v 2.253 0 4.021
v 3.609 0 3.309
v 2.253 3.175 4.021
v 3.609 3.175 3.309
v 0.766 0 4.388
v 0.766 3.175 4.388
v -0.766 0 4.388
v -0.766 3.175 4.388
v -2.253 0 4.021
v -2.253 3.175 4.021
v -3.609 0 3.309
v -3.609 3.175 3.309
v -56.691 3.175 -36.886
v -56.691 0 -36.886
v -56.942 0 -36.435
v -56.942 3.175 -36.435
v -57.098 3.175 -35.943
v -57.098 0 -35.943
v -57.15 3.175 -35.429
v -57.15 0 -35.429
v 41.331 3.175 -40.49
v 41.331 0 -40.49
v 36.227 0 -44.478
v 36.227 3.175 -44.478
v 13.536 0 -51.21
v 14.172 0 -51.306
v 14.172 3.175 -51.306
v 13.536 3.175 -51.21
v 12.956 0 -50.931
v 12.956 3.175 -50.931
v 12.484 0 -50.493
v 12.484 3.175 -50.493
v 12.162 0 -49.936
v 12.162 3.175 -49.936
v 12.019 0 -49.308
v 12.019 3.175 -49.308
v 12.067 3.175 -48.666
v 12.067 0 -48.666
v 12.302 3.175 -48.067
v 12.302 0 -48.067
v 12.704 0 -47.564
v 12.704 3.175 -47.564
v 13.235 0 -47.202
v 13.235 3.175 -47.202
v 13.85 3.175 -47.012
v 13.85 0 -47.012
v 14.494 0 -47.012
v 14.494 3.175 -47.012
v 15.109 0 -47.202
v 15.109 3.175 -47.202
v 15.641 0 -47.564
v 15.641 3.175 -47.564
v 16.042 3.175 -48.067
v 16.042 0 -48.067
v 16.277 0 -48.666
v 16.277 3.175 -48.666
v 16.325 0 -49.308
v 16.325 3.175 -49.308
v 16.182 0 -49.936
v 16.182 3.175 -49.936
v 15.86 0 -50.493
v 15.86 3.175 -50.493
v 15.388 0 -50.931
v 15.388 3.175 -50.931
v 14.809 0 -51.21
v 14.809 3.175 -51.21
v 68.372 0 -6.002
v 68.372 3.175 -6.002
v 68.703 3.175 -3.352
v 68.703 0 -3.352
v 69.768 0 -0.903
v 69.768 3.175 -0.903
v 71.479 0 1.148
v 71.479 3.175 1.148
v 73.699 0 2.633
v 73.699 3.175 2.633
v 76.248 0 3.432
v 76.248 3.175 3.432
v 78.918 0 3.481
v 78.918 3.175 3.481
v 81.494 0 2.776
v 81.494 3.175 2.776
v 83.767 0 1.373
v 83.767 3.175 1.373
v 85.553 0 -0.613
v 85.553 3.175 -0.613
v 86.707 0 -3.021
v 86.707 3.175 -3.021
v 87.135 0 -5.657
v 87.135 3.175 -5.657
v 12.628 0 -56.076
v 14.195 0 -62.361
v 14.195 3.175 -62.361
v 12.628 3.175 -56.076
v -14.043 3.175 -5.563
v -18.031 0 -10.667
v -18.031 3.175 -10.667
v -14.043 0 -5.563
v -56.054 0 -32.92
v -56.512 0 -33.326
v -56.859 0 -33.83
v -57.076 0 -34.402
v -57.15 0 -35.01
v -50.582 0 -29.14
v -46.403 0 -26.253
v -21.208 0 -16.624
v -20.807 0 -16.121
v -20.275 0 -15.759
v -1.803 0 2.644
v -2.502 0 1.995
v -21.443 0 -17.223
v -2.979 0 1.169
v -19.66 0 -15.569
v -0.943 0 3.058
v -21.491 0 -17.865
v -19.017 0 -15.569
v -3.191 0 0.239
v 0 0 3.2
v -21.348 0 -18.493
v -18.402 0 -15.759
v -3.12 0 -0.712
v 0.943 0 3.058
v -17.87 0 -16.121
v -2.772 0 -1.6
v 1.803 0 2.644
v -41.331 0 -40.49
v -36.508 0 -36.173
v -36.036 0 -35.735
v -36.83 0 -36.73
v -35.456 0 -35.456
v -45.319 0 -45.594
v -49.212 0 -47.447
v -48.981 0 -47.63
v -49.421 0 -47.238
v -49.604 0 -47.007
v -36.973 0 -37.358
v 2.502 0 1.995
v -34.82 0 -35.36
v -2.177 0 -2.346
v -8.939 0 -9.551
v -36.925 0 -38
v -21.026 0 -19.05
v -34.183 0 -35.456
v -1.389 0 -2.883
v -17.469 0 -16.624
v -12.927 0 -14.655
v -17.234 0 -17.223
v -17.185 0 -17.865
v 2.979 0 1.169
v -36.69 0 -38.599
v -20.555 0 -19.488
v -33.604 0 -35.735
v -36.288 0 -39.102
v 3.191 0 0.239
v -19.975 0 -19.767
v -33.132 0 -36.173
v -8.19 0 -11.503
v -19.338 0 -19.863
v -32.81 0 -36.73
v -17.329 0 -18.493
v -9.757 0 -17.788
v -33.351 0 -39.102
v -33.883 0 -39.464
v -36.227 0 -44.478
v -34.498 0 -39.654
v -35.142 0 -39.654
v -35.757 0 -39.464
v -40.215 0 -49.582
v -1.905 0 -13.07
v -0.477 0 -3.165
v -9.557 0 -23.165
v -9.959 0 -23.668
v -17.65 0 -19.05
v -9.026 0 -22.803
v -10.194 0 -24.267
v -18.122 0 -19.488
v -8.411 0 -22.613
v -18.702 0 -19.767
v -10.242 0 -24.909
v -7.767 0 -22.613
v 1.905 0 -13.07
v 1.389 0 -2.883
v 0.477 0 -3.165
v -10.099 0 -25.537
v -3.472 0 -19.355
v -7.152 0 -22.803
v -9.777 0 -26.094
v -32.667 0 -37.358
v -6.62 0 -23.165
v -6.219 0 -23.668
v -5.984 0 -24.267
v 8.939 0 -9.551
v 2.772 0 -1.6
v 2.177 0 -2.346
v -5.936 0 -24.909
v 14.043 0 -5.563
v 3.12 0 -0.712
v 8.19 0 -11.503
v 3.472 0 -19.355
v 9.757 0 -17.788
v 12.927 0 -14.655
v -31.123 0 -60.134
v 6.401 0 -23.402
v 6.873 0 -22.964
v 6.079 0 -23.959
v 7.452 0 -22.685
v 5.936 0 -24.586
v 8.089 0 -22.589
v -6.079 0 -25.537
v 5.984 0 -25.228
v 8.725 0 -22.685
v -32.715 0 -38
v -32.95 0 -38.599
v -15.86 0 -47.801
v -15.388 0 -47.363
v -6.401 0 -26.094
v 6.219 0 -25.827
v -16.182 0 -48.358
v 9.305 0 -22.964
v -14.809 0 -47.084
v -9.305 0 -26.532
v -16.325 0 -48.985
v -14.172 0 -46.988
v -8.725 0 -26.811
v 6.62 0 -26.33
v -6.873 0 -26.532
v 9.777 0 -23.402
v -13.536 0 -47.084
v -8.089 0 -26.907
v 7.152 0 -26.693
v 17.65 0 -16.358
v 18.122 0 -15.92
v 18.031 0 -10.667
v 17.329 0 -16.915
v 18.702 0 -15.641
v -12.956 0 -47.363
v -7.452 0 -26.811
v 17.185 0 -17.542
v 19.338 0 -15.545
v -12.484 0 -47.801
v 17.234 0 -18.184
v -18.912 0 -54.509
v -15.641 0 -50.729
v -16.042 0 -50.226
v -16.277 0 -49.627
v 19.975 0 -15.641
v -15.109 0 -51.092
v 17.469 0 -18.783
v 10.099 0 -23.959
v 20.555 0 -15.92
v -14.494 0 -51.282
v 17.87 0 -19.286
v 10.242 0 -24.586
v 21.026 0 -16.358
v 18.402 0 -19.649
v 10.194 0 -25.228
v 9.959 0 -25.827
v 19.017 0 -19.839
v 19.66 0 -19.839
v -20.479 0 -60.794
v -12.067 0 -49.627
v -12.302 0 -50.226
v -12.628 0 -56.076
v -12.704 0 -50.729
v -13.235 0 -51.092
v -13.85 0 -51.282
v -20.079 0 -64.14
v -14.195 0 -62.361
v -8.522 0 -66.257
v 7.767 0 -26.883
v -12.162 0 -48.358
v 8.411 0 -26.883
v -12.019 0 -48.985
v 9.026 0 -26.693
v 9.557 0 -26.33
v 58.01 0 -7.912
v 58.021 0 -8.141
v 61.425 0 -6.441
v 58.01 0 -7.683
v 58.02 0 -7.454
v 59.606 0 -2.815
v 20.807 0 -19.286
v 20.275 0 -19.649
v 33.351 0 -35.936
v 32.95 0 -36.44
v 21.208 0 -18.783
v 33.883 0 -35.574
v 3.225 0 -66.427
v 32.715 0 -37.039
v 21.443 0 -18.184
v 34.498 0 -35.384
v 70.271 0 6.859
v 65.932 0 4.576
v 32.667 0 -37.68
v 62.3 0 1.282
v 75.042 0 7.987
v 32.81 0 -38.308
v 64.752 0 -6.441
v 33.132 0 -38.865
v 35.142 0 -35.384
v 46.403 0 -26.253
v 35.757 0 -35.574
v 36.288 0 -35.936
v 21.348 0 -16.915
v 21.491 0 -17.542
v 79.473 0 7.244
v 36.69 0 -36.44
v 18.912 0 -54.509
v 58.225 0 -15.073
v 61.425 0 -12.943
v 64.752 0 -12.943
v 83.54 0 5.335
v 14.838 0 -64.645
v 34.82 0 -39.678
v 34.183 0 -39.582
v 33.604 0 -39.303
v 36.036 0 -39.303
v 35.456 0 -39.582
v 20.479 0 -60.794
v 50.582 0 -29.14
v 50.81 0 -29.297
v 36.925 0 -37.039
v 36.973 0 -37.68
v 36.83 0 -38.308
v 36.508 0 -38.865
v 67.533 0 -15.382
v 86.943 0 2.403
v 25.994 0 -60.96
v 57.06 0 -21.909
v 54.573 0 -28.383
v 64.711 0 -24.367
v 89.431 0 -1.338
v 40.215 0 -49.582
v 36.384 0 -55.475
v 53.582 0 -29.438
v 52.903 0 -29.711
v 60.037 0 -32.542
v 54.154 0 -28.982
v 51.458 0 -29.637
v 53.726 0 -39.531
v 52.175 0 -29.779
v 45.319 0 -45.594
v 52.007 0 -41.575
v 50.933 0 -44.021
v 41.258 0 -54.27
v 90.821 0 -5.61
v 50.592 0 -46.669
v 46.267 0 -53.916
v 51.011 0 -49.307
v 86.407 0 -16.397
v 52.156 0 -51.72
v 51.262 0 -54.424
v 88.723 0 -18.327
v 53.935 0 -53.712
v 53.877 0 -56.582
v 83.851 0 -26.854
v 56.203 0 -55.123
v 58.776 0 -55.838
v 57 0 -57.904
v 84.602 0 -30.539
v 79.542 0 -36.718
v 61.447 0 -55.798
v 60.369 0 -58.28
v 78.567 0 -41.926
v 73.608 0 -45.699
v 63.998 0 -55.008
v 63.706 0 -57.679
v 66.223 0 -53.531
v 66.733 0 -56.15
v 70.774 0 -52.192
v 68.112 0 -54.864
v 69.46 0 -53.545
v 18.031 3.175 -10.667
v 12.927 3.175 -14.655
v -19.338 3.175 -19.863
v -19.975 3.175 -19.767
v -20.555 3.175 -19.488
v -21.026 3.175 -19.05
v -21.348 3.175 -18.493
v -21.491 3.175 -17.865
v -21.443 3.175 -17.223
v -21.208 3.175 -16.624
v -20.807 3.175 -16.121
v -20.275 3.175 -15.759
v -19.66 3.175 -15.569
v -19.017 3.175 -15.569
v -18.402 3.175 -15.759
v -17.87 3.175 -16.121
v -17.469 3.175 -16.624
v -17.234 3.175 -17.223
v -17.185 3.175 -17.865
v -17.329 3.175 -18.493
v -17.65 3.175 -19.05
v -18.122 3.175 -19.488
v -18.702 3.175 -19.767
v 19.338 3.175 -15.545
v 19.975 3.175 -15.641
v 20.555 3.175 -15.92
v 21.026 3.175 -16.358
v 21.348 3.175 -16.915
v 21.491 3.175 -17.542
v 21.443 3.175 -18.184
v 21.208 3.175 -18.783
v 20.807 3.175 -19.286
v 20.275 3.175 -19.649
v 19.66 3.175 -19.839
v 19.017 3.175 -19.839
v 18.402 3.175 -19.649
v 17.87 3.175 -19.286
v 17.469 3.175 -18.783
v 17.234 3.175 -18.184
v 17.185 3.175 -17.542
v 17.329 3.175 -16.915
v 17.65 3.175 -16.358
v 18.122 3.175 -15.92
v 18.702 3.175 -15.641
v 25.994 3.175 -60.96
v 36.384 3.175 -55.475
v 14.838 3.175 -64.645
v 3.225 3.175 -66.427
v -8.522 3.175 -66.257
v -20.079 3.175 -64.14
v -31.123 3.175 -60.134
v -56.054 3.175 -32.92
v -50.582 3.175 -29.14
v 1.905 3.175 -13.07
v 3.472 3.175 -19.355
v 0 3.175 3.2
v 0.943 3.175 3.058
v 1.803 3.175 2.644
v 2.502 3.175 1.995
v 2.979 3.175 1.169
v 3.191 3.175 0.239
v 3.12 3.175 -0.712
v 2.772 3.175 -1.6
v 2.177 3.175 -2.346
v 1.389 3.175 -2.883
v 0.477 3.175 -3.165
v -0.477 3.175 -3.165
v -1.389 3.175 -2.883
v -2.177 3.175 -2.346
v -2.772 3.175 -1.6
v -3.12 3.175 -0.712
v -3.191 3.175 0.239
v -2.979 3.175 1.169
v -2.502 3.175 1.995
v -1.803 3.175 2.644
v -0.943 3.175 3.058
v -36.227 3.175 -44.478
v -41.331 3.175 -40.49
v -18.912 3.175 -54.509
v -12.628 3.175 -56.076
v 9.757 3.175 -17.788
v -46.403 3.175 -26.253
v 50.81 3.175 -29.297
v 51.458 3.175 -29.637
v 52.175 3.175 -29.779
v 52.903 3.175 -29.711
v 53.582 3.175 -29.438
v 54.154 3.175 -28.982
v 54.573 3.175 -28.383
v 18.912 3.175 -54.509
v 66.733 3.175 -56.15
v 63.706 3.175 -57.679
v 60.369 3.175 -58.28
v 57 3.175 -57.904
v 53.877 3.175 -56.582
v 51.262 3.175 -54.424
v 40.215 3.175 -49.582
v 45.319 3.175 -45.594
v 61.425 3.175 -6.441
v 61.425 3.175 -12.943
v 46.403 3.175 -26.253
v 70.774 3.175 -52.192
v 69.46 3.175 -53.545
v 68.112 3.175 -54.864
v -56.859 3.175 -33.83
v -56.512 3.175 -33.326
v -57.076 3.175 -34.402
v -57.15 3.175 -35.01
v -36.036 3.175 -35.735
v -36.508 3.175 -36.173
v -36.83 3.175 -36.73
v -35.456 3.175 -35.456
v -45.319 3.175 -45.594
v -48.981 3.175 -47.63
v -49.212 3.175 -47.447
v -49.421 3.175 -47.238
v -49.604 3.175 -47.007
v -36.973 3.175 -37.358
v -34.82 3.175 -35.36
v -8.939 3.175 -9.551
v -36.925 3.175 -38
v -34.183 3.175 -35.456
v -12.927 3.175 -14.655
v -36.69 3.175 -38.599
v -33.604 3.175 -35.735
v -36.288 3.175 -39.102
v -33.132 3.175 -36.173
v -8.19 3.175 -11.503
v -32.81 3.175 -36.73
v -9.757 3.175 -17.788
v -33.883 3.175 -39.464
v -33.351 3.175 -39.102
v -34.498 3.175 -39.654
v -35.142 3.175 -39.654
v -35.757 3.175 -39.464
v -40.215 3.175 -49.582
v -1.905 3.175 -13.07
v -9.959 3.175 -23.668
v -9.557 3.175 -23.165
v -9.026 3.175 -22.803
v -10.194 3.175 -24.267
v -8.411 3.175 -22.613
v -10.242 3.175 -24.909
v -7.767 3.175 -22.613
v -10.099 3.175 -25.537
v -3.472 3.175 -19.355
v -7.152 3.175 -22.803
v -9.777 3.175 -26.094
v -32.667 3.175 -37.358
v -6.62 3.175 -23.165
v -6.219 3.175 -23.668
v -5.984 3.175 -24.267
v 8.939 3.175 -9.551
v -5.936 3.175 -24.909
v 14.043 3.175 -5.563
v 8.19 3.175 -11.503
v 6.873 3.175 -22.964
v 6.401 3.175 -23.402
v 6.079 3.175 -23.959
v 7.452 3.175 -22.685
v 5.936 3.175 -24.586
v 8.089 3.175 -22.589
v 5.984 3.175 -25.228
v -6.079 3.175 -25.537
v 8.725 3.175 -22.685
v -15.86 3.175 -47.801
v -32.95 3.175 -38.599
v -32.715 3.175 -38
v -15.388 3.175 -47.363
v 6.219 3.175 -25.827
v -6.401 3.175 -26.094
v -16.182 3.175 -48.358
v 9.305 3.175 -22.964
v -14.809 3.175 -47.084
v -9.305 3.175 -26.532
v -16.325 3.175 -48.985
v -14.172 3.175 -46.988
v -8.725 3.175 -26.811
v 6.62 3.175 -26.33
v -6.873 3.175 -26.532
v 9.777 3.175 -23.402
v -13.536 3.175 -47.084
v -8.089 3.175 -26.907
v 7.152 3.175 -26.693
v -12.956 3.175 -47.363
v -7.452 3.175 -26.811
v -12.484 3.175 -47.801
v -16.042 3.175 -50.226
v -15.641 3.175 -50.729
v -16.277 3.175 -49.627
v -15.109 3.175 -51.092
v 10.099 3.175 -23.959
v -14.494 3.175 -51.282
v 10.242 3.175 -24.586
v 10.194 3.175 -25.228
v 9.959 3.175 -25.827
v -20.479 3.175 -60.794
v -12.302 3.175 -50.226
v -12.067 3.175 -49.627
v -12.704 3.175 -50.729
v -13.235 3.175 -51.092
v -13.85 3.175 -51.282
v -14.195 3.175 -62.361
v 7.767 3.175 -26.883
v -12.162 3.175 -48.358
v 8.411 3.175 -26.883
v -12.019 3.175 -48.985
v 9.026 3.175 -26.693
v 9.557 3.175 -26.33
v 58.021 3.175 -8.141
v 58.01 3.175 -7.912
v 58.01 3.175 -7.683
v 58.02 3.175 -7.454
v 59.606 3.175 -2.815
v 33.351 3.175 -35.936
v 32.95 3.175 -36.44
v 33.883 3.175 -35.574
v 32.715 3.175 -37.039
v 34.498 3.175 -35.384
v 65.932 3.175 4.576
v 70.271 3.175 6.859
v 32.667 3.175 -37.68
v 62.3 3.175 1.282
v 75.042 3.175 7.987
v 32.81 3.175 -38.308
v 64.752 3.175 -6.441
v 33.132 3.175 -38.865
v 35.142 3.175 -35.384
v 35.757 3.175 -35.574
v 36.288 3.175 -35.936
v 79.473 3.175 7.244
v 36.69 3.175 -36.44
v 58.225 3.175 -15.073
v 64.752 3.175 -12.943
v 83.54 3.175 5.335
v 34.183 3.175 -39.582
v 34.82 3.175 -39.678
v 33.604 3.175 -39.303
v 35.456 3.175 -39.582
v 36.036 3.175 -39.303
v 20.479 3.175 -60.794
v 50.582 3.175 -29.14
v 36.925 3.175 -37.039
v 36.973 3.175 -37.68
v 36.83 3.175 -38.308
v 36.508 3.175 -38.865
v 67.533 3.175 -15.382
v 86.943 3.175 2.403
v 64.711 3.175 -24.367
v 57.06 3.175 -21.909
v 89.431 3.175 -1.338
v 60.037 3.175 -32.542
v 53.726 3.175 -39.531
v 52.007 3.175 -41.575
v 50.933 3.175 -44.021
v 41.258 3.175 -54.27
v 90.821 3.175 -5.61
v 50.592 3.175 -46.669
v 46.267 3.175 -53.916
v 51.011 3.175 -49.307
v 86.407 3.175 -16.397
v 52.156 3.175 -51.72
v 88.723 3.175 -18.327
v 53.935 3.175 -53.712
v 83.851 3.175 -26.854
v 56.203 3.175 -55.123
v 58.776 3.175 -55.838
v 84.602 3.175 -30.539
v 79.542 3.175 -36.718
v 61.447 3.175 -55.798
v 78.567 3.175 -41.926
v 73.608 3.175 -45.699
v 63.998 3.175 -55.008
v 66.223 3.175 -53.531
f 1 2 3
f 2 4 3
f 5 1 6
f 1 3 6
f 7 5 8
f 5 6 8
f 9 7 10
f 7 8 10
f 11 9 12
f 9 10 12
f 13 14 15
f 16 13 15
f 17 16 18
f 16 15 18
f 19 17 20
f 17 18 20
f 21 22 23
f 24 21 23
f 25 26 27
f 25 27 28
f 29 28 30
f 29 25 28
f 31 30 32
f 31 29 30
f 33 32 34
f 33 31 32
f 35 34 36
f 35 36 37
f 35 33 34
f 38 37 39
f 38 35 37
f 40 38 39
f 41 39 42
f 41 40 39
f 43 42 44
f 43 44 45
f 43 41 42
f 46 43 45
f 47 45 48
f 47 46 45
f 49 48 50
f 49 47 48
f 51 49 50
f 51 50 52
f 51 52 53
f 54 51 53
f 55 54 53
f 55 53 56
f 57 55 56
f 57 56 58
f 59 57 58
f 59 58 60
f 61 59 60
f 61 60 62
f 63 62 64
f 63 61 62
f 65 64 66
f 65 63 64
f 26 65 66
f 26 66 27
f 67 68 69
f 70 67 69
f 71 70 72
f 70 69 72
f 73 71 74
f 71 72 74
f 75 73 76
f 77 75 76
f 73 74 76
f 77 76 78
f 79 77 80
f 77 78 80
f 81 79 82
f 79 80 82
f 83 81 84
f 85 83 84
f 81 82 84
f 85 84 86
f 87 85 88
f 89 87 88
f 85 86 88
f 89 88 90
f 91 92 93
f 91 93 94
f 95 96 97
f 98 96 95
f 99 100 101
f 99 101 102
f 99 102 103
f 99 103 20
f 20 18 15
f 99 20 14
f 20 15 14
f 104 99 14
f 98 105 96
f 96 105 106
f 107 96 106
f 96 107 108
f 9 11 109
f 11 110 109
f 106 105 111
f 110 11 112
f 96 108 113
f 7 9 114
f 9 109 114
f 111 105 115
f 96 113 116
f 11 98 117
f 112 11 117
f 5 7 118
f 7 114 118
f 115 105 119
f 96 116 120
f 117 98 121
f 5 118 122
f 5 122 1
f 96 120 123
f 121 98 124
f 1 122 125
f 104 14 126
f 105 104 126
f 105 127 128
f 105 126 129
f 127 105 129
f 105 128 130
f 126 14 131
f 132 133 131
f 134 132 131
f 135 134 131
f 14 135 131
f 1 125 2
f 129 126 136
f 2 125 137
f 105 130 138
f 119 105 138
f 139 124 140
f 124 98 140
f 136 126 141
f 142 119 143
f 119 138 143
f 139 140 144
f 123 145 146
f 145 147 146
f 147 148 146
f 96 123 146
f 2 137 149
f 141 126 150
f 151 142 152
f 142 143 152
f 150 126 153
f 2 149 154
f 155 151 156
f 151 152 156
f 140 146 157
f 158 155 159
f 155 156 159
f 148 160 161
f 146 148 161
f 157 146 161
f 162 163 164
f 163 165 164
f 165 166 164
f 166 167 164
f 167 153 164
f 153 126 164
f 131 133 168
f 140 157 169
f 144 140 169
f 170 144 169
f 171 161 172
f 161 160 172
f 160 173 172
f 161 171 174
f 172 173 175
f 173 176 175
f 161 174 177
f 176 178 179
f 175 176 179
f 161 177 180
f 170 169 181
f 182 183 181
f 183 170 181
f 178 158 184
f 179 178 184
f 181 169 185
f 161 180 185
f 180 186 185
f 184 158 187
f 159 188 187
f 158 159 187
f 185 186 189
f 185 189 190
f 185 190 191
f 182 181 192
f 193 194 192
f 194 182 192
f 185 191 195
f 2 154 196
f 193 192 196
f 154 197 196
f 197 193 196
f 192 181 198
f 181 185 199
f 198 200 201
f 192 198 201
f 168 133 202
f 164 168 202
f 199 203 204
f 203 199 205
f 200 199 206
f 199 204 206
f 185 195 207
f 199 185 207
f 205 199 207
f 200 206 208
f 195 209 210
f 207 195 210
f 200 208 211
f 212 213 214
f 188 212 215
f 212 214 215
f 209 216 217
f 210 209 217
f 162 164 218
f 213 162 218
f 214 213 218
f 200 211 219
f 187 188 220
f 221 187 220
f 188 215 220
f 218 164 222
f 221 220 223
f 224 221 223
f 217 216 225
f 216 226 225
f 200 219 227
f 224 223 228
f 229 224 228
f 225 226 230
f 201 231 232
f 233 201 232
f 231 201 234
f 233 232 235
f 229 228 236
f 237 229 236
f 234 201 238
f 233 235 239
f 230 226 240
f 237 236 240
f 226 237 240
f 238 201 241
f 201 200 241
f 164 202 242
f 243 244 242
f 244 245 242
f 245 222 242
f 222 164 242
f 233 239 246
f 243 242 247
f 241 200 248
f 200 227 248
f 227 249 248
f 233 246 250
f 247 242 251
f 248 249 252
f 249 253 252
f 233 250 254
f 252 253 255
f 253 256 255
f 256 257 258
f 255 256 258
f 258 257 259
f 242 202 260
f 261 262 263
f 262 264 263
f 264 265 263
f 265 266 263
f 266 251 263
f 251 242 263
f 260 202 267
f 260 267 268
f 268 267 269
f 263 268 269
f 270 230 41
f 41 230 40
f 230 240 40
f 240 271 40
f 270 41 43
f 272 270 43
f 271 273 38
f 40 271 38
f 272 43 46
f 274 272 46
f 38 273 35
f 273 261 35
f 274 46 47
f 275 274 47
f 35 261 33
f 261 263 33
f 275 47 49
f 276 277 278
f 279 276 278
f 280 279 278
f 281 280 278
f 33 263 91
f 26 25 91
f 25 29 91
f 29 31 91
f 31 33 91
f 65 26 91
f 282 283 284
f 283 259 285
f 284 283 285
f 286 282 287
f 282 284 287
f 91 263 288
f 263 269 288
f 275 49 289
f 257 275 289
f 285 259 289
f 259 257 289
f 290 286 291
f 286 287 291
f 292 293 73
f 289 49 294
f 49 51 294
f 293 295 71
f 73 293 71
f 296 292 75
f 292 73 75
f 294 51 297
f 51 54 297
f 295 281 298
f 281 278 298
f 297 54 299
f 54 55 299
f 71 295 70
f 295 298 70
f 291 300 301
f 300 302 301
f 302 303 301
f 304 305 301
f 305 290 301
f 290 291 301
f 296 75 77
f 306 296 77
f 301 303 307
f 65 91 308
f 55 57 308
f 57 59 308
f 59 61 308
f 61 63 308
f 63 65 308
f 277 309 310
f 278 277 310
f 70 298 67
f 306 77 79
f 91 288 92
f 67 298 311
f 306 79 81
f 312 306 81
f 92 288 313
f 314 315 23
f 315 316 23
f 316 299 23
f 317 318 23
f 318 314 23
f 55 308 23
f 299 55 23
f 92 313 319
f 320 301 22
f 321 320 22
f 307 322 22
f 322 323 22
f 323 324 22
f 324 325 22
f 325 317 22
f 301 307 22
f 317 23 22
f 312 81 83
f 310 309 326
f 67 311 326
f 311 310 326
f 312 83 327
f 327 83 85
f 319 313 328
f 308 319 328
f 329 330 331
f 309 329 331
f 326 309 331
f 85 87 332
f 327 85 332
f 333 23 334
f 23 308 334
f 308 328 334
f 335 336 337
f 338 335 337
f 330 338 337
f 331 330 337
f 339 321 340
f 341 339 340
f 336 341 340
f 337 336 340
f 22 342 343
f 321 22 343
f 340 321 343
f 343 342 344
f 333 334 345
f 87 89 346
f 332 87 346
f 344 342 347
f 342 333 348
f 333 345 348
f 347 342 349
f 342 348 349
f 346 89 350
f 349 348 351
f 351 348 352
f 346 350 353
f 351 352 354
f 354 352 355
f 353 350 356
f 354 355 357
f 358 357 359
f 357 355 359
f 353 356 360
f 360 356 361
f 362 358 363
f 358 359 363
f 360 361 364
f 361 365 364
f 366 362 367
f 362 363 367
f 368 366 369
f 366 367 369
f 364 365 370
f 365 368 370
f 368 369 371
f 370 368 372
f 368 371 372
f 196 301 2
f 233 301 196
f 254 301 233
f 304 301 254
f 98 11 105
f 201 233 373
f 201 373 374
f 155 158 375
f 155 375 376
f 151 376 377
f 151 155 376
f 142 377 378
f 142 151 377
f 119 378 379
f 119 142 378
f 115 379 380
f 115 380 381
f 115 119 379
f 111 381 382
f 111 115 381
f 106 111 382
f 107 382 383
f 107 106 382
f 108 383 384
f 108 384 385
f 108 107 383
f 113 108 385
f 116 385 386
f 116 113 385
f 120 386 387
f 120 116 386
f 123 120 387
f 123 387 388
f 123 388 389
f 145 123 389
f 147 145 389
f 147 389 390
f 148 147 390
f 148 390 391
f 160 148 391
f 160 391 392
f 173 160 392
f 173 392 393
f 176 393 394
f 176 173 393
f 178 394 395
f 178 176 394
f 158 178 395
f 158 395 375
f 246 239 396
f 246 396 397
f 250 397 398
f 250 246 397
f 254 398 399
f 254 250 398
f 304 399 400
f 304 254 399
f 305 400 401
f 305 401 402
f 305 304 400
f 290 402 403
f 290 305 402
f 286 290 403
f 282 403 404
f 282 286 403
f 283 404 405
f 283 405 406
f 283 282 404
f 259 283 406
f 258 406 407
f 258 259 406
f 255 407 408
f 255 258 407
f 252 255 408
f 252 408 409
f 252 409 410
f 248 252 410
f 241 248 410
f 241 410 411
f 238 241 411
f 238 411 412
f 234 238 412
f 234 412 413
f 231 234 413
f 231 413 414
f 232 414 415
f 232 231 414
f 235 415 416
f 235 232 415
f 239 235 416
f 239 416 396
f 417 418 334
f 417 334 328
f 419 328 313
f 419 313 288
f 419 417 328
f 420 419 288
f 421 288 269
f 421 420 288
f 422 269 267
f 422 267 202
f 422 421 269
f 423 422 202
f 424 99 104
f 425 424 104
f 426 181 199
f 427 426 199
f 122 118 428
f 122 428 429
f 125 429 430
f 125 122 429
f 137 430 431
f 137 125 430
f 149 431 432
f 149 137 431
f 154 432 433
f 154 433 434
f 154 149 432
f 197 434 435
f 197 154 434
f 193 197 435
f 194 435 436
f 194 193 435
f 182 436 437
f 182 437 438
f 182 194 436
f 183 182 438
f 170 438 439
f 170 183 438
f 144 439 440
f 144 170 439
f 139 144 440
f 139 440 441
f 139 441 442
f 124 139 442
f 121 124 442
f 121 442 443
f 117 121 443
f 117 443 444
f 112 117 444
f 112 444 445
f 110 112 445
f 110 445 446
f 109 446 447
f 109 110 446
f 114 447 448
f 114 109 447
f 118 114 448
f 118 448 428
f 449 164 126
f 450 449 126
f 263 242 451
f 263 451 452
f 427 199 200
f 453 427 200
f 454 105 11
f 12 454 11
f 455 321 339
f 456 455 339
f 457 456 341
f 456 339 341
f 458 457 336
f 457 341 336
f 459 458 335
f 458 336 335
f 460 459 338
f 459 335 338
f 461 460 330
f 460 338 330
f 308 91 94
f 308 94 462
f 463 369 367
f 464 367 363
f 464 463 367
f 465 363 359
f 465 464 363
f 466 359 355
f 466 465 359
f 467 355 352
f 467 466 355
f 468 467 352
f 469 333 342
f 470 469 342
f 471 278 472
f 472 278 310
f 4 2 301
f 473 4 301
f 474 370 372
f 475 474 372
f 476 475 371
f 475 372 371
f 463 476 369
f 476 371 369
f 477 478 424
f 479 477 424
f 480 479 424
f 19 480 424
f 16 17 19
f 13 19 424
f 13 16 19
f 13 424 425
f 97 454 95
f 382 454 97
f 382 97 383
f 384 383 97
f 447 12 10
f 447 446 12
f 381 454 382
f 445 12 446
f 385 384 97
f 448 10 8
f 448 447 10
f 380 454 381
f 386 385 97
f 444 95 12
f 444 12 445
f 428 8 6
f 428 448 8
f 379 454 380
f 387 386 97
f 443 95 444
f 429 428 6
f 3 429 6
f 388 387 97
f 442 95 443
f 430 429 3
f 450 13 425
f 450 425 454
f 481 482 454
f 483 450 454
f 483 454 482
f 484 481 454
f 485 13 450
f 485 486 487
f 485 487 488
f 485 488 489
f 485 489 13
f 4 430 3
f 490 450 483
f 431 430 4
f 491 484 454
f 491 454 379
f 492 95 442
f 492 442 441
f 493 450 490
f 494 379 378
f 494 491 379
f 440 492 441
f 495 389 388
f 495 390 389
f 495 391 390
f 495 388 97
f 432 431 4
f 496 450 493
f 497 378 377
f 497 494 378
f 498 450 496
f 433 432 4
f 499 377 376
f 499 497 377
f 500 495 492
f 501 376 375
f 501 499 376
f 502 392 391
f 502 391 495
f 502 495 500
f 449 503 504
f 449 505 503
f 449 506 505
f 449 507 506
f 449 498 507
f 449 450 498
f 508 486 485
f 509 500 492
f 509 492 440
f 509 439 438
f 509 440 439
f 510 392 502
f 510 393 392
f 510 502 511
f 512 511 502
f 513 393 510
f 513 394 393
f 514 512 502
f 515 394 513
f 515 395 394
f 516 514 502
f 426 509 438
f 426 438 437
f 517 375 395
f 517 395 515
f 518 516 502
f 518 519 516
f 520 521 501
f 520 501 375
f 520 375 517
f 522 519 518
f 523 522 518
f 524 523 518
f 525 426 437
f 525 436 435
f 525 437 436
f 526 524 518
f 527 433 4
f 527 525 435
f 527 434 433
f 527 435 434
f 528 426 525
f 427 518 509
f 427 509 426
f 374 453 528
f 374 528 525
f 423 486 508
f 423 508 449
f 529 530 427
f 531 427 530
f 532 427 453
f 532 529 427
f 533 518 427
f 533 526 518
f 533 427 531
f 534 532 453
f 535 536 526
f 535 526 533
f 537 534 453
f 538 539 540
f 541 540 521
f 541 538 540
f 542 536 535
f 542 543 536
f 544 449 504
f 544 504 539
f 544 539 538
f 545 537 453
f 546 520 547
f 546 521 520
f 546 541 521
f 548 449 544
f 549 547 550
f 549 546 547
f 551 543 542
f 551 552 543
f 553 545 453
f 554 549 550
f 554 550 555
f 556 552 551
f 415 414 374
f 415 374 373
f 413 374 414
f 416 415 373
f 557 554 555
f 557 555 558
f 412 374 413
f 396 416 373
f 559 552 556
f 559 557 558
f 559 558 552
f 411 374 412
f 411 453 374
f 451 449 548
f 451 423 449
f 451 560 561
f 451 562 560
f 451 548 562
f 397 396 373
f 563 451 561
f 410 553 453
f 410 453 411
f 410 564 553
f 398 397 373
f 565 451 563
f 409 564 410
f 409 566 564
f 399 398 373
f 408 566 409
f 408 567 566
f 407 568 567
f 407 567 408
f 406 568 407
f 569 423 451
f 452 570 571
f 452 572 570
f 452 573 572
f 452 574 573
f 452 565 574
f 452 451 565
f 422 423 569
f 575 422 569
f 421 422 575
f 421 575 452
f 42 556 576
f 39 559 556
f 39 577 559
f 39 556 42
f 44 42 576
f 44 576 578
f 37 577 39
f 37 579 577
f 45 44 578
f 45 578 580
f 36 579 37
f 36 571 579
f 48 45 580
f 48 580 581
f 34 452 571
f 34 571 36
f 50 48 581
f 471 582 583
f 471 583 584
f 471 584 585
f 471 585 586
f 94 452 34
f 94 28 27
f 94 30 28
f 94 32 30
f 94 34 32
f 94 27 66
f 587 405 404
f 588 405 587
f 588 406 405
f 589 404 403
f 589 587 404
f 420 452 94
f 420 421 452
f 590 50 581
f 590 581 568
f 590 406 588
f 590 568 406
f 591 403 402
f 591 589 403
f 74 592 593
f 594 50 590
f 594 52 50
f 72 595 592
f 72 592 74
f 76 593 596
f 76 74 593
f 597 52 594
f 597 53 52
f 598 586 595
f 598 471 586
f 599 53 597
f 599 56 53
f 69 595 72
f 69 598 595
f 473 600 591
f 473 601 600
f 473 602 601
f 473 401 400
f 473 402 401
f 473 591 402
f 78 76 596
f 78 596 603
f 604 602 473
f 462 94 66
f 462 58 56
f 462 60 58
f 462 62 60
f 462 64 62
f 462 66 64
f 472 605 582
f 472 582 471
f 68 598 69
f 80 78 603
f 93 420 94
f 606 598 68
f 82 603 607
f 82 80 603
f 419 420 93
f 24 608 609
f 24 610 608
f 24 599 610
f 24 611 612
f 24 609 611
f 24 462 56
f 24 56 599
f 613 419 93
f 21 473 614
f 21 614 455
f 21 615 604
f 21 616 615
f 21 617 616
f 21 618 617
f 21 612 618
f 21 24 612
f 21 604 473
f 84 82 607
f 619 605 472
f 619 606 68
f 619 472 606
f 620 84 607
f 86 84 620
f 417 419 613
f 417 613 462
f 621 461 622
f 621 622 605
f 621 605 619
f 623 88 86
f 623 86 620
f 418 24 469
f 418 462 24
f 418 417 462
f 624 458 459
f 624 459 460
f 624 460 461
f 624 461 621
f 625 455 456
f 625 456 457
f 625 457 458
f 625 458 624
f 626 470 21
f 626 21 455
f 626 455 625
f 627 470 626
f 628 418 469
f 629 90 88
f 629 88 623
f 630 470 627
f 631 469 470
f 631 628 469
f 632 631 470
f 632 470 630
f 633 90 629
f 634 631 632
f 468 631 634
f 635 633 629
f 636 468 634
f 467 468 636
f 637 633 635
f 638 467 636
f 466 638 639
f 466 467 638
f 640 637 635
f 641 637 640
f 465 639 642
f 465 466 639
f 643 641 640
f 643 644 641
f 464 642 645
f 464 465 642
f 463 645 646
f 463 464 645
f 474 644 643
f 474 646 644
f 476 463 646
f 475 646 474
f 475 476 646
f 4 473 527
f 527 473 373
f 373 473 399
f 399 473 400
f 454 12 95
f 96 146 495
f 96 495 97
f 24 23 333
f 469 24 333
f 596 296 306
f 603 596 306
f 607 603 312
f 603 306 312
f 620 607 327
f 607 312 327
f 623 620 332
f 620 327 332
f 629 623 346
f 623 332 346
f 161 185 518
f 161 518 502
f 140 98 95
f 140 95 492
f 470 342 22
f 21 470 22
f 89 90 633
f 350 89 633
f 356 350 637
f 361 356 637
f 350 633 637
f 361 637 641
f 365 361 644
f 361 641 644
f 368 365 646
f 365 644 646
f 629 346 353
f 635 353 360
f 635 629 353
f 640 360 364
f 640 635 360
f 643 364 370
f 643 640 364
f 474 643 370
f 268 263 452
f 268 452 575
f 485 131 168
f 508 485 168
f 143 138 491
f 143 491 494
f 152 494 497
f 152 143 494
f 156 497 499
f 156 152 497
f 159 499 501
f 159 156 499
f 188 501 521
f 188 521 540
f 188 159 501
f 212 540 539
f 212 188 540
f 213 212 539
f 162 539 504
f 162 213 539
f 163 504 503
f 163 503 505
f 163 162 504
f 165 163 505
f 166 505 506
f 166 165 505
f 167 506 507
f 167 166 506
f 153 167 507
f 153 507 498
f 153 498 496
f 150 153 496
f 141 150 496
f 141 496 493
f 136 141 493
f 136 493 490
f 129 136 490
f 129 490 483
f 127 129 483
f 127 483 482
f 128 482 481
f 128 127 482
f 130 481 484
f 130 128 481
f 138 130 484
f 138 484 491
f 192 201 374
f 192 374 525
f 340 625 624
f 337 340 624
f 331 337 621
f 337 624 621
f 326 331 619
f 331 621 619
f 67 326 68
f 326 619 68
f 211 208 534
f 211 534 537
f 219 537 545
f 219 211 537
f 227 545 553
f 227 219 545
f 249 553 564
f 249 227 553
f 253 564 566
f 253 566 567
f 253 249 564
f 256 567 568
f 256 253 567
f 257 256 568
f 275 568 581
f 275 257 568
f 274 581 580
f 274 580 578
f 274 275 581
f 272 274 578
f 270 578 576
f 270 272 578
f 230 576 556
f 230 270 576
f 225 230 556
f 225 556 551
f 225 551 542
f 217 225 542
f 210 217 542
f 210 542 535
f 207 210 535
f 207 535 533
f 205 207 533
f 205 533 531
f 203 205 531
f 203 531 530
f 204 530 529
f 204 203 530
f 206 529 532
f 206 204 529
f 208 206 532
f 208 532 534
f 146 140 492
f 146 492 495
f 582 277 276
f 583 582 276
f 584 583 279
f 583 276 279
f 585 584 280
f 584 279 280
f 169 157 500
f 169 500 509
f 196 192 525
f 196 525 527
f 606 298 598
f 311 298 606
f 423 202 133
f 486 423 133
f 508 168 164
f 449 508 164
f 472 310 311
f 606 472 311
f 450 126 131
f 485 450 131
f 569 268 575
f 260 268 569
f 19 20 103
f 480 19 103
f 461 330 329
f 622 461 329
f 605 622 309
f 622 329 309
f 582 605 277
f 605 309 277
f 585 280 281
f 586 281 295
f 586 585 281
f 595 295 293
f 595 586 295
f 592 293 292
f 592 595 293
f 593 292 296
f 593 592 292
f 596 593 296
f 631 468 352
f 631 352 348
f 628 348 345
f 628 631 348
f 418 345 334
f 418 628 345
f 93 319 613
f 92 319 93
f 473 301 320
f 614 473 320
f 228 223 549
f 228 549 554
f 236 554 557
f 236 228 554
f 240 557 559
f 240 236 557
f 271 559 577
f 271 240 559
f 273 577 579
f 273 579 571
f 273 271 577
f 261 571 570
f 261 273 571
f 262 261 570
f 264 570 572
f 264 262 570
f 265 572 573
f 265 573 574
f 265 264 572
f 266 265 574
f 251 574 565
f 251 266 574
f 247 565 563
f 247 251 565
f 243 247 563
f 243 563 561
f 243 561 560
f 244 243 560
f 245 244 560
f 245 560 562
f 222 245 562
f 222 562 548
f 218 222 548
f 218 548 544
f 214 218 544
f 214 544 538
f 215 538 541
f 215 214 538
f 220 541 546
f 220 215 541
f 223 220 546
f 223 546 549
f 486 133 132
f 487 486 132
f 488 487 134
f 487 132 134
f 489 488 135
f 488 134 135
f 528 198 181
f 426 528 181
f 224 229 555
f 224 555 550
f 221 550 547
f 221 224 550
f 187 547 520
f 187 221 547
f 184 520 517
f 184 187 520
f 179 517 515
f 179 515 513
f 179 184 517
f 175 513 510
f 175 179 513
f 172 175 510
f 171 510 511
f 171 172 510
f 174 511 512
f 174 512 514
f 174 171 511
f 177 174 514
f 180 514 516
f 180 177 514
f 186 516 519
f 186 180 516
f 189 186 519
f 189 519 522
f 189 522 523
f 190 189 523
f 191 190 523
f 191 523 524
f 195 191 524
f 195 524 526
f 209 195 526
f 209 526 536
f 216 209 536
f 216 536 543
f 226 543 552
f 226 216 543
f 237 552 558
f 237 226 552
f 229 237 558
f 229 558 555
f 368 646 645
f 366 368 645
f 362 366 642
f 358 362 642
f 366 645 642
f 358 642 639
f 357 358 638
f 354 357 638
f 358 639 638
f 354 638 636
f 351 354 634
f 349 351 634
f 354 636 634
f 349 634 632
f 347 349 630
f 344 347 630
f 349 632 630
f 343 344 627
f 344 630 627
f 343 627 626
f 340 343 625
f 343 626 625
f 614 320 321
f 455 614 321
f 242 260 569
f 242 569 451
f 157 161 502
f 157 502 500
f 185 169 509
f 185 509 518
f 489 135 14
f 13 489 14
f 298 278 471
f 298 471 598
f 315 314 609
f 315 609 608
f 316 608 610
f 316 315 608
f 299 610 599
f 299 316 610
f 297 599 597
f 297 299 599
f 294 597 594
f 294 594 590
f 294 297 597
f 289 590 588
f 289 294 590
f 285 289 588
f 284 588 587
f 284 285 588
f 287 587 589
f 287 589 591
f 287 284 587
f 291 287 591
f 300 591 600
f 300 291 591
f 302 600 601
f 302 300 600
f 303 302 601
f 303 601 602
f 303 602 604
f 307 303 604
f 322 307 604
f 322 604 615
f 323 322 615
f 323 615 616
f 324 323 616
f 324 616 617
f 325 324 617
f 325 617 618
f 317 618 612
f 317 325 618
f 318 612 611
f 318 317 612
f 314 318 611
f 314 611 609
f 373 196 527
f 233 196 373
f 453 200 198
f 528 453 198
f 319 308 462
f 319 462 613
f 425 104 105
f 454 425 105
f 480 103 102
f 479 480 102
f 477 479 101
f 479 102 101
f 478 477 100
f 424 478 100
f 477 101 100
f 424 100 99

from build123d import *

# Parameters (mm, degrees)
SKETCH1_R           = 3.2004
SKETCH1_R_2         = 2.159
SKETCH1_W           = 3.3274
SKETCH1_H           = 6.5024
BOSS_EXTRUDE1_DEPTH = 3.175
FILLET1_R           = 6.35
CUT_EXTRUDE1_DEPTH  = 119.620638985
CUT_EXTRUDE2_DEPTH  = 119.620638985


with BuildPart() as part:
    # Sketch1 → Boss-Extrude1 (new body)
    with BuildSketch(Plane(origin=(0, 0, 0), x_dir=(1, 0, 0), z_dir=(0, 1, 0))):
        with BuildLine():
            Line((46.403243059, 26.253216793), (50.58203093, 29.139941438))
            Line((50.58203093, 29.139941438), (50.810401684, 29.296808651))
            ThreePointArc((50.810401684, 29.296808651), (52.903191273, 29.710570717), (54.573236871, 28.38319925))
            ThreePointArc((54.573236871, 28.38319925), (57.812038803, 18.519910789), (58.021057072, 8.140575136))
            ThreePointArc((58.021057072, 8.140575136), (58.019631397, 7.454008247), (58.110797015, 6.773519483))
            ThreePointArc((58.110797015, 6.773519483), (77.605374828, -7.708974753), (90.50576443, 12.866767069))
            ThreePointArc((90.50576443, 12.866767069), (43.472529066, 70.626376988), (-30.323774881, 60.506925891))
            ThreePointArc((-30.323774881, 60.506925891), (-30.739824891, 60.355496072), (-31.123258654, 60.134120485))
            Line((-31.123258654, 60.134120485), (-48.980521588, 47.630330367))
            ThreePointArc((-48.980521588, 47.630330367), (-49.319688664, 47.345735399), (-49.604283632, 47.006568323))
            Line((-49.604283632, 47.006568323), (-56.690646192, 36.886193758))
            ThreePointArc((-56.690646192, 36.886193758), (-57.032441055, 36.19310234), (-57.15, 35.429309609))
            Line((-57.15, 35.429309609), (-57.15, 35.009609836))
            ThreePointArc((-57.15, 35.009609836), (-56.859279722, 33.82963495), (-56.053668716, 32.919772369))
            Line((-56.053668716, 32.919772369), (-50.58203093, 29.139941438))
            Line((-50.58203093, 29.139941438), (-46.403243059, 26.253216793))
            Line((-46.403243059, 26.253216793), (0, -5.80234322))
            Line((0, -5.80234322), (46.403243059, 26.253216793))
        make_face()
        with Locations(Location((0, 0, 0), (0, 0, 270))):
            Circle(SKETCH1_R, mode=Mode.SUBTRACT)
        with Locations(Location((-14.172189073, 49.146835797, 0), (0, 0, 270))):
            Circle(SKETCH1_R_2, mode=Mode.SUBTRACT)
        with Locations(Location((-8.088821086, 24.747779464, 0), (0, 0, 90))):
            Circle(SKETCH1_R_2, mode=Mode.SUBTRACT)
        with Locations(Location((-34.819826997, 37.519095065, 0), (0, 0, 270))):
            Circle(SKETCH1_R_2, mode=Mode.SUBTRACT)
        with Locations(Location((-19.338403539, 17.703776655, 0), (0, 0, 90))):
            Circle(SKETCH1_R_2, mode=Mode.SUBTRACT)
        with Locations(Location((34.819826997, 37.519095065, 0), (0, 0, 90))):
            Circle(SKETCH1_R_2, mode=Mode.SUBTRACT)
        with Locations(Location((19.338403539, 17.703776655, 0), (0, 0, 270))):
            Circle(SKETCH1_R_2, mode=Mode.SUBTRACT)
        with Locations(Location((8.088821086, 24.747779464, 0), (0, 0, 270))):
            Circle(SKETCH1_R_2, mode=Mode.SUBTRACT)
        with Locations(Location((14.172189073, 49.146835797, 0), (0, 0, 90))):
            Circle(SKETCH1_R_2, mode=Mode.SUBTRACT)
        Polygon((-14.194632296, 62.360921096), (-20.479237716, 60.793992979), (-18.912309598, 54.50938756), (-12.627704179, 56.076315677), align=None, mode=Mode.SUBTRACT)
        Polygon((-3.471928118, 19.354503621), (-9.756533537, 17.787575503), (-8.189605419, 11.502970084), (-1.905, 13.069898202), align=None, mode=Mode.SUBTRACT)
        Polygon((-12.927019028, 14.654633554), (-18.030964679, 10.666994178), (-14.043325303, 5.563048527), (-8.939379652, 9.550687903), align=None, mode=Mode.SUBTRACT)
        Polygon((-36.227343223, 44.477688535), (-41.331288874, 40.490049159), (-45.31892825, 45.59399481), (-40.214982599, 49.581634186), align=None, mode=Mode.SUBTRACT)
        Polygon((40.214982599, 49.581634186), (45.31892825, 45.59399481), (41.331288874, 40.490049159), (36.227343223, 44.477688535), align=None, mode=Mode.SUBTRACT)
        Polygon((8.939379652, 9.550687903), (14.043325303, 5.563048527), (18.030964679, 10.666994178), (12.927019028, 14.654633554), align=None, mode=Mode.SUBTRACT)
        Polygon((9.756533537, 17.787575503), (8.189605419, 11.502970084), (1.905, 13.069898202), (3.471928118, 19.354503621), align=None, mode=Mode.SUBTRACT)
        Polygon((14.194632296, 62.360921096), (12.627704179, 56.076315677), (18.912309598, 54.50938756), (20.479237716, 60.793992979), align=None, mode=Mode.SUBTRACT)
        with Locations((63.088721213, 9.69176707)):
            Rectangle(SKETCH1_W, SKETCH1_H, mode=Mode.SUBTRACT)
    extrude(amount=BOSS_EXTRUDE1_DEPTH)

    # Fillet1
    fillet1_edges = [part.edges().sort_by_distance(p)[0] for p in [
        (0, 1.5875, 5.80234322),
    ]]
    fillet(fillet1_edges, radius=FILLET1_R)

    # Sketch2 → Cut-Extrude1 (cut, through all)
    with BuildSketch(Plane(origin=(0, 3.175, 0), x_dir=(1, 0, 0), z_dir=(0, 1, 0))):
        with BuildLine():
            ThreePointArc((87.135212516, 5.657351319), (81.909051328, 31.878788039), (66.223051077, 53.53117591))
            ThreePointArc((66.223051077, 53.53117591), (52.97426357, 52.779767692), (53.725671788, 39.530980185))
            ThreePointArc((53.725671788, 39.530980185), (64.711476112, 24.366572912), (68.371656098, 6.002199057))
            ThreePointArc((68.371656098, 6.002199057), (77.581010438, -3.552003021), (87.135212516, 5.657351319))
        make_face()
    extrude(amount=-CUT_EXTRUDE1_DEPTH, mode=Mode.SUBTRACT)

    # Sketch3 → Cut-Extrude2 (cut, through all)
    with BuildSketch(Plane(origin=(0, 3.175, 0), x_dir=(1, 0, 0), z_dir=(0, 1, 0))):
        with BuildLine():
            ThreePointArc((91.082221145, -2.183816518), (85.424919637, 28.55421491), (68.37898463, 54.750927226))
            ThreePointArc((68.37898463, 54.750927226), (59.749990126, 58.284939929), (51.262155566, 54.424181401))
            ThreePointArc((51.262155566, 54.424181401), (43.754739182, 53.985373594), (36.383549974, 55.4751463))
            ThreePointArc((36.383549974, 55.4751463), (3.225200598, 66.426758828), (-31.123258654, 60.134120485))
            ThreePointArc((-31.123258654, 60.134120485), (64.717904465, 75.405291468), (123.015996485, -2.183816518))
            ThreePointArc((123.015996485, -2.183816518), (86.509258073, -24.398136946), (58.019631397, 7.454008247))
            ThreePointArc((58.019631397, 7.454008247), (71.64980722, -7.317202642), (91.082221145, -2.183816518))
        make_face()
    extrude(amount=-CUT_EXTRUDE2_DEPTH, mode=Mode.SUBTRACT)


solid = part.part
